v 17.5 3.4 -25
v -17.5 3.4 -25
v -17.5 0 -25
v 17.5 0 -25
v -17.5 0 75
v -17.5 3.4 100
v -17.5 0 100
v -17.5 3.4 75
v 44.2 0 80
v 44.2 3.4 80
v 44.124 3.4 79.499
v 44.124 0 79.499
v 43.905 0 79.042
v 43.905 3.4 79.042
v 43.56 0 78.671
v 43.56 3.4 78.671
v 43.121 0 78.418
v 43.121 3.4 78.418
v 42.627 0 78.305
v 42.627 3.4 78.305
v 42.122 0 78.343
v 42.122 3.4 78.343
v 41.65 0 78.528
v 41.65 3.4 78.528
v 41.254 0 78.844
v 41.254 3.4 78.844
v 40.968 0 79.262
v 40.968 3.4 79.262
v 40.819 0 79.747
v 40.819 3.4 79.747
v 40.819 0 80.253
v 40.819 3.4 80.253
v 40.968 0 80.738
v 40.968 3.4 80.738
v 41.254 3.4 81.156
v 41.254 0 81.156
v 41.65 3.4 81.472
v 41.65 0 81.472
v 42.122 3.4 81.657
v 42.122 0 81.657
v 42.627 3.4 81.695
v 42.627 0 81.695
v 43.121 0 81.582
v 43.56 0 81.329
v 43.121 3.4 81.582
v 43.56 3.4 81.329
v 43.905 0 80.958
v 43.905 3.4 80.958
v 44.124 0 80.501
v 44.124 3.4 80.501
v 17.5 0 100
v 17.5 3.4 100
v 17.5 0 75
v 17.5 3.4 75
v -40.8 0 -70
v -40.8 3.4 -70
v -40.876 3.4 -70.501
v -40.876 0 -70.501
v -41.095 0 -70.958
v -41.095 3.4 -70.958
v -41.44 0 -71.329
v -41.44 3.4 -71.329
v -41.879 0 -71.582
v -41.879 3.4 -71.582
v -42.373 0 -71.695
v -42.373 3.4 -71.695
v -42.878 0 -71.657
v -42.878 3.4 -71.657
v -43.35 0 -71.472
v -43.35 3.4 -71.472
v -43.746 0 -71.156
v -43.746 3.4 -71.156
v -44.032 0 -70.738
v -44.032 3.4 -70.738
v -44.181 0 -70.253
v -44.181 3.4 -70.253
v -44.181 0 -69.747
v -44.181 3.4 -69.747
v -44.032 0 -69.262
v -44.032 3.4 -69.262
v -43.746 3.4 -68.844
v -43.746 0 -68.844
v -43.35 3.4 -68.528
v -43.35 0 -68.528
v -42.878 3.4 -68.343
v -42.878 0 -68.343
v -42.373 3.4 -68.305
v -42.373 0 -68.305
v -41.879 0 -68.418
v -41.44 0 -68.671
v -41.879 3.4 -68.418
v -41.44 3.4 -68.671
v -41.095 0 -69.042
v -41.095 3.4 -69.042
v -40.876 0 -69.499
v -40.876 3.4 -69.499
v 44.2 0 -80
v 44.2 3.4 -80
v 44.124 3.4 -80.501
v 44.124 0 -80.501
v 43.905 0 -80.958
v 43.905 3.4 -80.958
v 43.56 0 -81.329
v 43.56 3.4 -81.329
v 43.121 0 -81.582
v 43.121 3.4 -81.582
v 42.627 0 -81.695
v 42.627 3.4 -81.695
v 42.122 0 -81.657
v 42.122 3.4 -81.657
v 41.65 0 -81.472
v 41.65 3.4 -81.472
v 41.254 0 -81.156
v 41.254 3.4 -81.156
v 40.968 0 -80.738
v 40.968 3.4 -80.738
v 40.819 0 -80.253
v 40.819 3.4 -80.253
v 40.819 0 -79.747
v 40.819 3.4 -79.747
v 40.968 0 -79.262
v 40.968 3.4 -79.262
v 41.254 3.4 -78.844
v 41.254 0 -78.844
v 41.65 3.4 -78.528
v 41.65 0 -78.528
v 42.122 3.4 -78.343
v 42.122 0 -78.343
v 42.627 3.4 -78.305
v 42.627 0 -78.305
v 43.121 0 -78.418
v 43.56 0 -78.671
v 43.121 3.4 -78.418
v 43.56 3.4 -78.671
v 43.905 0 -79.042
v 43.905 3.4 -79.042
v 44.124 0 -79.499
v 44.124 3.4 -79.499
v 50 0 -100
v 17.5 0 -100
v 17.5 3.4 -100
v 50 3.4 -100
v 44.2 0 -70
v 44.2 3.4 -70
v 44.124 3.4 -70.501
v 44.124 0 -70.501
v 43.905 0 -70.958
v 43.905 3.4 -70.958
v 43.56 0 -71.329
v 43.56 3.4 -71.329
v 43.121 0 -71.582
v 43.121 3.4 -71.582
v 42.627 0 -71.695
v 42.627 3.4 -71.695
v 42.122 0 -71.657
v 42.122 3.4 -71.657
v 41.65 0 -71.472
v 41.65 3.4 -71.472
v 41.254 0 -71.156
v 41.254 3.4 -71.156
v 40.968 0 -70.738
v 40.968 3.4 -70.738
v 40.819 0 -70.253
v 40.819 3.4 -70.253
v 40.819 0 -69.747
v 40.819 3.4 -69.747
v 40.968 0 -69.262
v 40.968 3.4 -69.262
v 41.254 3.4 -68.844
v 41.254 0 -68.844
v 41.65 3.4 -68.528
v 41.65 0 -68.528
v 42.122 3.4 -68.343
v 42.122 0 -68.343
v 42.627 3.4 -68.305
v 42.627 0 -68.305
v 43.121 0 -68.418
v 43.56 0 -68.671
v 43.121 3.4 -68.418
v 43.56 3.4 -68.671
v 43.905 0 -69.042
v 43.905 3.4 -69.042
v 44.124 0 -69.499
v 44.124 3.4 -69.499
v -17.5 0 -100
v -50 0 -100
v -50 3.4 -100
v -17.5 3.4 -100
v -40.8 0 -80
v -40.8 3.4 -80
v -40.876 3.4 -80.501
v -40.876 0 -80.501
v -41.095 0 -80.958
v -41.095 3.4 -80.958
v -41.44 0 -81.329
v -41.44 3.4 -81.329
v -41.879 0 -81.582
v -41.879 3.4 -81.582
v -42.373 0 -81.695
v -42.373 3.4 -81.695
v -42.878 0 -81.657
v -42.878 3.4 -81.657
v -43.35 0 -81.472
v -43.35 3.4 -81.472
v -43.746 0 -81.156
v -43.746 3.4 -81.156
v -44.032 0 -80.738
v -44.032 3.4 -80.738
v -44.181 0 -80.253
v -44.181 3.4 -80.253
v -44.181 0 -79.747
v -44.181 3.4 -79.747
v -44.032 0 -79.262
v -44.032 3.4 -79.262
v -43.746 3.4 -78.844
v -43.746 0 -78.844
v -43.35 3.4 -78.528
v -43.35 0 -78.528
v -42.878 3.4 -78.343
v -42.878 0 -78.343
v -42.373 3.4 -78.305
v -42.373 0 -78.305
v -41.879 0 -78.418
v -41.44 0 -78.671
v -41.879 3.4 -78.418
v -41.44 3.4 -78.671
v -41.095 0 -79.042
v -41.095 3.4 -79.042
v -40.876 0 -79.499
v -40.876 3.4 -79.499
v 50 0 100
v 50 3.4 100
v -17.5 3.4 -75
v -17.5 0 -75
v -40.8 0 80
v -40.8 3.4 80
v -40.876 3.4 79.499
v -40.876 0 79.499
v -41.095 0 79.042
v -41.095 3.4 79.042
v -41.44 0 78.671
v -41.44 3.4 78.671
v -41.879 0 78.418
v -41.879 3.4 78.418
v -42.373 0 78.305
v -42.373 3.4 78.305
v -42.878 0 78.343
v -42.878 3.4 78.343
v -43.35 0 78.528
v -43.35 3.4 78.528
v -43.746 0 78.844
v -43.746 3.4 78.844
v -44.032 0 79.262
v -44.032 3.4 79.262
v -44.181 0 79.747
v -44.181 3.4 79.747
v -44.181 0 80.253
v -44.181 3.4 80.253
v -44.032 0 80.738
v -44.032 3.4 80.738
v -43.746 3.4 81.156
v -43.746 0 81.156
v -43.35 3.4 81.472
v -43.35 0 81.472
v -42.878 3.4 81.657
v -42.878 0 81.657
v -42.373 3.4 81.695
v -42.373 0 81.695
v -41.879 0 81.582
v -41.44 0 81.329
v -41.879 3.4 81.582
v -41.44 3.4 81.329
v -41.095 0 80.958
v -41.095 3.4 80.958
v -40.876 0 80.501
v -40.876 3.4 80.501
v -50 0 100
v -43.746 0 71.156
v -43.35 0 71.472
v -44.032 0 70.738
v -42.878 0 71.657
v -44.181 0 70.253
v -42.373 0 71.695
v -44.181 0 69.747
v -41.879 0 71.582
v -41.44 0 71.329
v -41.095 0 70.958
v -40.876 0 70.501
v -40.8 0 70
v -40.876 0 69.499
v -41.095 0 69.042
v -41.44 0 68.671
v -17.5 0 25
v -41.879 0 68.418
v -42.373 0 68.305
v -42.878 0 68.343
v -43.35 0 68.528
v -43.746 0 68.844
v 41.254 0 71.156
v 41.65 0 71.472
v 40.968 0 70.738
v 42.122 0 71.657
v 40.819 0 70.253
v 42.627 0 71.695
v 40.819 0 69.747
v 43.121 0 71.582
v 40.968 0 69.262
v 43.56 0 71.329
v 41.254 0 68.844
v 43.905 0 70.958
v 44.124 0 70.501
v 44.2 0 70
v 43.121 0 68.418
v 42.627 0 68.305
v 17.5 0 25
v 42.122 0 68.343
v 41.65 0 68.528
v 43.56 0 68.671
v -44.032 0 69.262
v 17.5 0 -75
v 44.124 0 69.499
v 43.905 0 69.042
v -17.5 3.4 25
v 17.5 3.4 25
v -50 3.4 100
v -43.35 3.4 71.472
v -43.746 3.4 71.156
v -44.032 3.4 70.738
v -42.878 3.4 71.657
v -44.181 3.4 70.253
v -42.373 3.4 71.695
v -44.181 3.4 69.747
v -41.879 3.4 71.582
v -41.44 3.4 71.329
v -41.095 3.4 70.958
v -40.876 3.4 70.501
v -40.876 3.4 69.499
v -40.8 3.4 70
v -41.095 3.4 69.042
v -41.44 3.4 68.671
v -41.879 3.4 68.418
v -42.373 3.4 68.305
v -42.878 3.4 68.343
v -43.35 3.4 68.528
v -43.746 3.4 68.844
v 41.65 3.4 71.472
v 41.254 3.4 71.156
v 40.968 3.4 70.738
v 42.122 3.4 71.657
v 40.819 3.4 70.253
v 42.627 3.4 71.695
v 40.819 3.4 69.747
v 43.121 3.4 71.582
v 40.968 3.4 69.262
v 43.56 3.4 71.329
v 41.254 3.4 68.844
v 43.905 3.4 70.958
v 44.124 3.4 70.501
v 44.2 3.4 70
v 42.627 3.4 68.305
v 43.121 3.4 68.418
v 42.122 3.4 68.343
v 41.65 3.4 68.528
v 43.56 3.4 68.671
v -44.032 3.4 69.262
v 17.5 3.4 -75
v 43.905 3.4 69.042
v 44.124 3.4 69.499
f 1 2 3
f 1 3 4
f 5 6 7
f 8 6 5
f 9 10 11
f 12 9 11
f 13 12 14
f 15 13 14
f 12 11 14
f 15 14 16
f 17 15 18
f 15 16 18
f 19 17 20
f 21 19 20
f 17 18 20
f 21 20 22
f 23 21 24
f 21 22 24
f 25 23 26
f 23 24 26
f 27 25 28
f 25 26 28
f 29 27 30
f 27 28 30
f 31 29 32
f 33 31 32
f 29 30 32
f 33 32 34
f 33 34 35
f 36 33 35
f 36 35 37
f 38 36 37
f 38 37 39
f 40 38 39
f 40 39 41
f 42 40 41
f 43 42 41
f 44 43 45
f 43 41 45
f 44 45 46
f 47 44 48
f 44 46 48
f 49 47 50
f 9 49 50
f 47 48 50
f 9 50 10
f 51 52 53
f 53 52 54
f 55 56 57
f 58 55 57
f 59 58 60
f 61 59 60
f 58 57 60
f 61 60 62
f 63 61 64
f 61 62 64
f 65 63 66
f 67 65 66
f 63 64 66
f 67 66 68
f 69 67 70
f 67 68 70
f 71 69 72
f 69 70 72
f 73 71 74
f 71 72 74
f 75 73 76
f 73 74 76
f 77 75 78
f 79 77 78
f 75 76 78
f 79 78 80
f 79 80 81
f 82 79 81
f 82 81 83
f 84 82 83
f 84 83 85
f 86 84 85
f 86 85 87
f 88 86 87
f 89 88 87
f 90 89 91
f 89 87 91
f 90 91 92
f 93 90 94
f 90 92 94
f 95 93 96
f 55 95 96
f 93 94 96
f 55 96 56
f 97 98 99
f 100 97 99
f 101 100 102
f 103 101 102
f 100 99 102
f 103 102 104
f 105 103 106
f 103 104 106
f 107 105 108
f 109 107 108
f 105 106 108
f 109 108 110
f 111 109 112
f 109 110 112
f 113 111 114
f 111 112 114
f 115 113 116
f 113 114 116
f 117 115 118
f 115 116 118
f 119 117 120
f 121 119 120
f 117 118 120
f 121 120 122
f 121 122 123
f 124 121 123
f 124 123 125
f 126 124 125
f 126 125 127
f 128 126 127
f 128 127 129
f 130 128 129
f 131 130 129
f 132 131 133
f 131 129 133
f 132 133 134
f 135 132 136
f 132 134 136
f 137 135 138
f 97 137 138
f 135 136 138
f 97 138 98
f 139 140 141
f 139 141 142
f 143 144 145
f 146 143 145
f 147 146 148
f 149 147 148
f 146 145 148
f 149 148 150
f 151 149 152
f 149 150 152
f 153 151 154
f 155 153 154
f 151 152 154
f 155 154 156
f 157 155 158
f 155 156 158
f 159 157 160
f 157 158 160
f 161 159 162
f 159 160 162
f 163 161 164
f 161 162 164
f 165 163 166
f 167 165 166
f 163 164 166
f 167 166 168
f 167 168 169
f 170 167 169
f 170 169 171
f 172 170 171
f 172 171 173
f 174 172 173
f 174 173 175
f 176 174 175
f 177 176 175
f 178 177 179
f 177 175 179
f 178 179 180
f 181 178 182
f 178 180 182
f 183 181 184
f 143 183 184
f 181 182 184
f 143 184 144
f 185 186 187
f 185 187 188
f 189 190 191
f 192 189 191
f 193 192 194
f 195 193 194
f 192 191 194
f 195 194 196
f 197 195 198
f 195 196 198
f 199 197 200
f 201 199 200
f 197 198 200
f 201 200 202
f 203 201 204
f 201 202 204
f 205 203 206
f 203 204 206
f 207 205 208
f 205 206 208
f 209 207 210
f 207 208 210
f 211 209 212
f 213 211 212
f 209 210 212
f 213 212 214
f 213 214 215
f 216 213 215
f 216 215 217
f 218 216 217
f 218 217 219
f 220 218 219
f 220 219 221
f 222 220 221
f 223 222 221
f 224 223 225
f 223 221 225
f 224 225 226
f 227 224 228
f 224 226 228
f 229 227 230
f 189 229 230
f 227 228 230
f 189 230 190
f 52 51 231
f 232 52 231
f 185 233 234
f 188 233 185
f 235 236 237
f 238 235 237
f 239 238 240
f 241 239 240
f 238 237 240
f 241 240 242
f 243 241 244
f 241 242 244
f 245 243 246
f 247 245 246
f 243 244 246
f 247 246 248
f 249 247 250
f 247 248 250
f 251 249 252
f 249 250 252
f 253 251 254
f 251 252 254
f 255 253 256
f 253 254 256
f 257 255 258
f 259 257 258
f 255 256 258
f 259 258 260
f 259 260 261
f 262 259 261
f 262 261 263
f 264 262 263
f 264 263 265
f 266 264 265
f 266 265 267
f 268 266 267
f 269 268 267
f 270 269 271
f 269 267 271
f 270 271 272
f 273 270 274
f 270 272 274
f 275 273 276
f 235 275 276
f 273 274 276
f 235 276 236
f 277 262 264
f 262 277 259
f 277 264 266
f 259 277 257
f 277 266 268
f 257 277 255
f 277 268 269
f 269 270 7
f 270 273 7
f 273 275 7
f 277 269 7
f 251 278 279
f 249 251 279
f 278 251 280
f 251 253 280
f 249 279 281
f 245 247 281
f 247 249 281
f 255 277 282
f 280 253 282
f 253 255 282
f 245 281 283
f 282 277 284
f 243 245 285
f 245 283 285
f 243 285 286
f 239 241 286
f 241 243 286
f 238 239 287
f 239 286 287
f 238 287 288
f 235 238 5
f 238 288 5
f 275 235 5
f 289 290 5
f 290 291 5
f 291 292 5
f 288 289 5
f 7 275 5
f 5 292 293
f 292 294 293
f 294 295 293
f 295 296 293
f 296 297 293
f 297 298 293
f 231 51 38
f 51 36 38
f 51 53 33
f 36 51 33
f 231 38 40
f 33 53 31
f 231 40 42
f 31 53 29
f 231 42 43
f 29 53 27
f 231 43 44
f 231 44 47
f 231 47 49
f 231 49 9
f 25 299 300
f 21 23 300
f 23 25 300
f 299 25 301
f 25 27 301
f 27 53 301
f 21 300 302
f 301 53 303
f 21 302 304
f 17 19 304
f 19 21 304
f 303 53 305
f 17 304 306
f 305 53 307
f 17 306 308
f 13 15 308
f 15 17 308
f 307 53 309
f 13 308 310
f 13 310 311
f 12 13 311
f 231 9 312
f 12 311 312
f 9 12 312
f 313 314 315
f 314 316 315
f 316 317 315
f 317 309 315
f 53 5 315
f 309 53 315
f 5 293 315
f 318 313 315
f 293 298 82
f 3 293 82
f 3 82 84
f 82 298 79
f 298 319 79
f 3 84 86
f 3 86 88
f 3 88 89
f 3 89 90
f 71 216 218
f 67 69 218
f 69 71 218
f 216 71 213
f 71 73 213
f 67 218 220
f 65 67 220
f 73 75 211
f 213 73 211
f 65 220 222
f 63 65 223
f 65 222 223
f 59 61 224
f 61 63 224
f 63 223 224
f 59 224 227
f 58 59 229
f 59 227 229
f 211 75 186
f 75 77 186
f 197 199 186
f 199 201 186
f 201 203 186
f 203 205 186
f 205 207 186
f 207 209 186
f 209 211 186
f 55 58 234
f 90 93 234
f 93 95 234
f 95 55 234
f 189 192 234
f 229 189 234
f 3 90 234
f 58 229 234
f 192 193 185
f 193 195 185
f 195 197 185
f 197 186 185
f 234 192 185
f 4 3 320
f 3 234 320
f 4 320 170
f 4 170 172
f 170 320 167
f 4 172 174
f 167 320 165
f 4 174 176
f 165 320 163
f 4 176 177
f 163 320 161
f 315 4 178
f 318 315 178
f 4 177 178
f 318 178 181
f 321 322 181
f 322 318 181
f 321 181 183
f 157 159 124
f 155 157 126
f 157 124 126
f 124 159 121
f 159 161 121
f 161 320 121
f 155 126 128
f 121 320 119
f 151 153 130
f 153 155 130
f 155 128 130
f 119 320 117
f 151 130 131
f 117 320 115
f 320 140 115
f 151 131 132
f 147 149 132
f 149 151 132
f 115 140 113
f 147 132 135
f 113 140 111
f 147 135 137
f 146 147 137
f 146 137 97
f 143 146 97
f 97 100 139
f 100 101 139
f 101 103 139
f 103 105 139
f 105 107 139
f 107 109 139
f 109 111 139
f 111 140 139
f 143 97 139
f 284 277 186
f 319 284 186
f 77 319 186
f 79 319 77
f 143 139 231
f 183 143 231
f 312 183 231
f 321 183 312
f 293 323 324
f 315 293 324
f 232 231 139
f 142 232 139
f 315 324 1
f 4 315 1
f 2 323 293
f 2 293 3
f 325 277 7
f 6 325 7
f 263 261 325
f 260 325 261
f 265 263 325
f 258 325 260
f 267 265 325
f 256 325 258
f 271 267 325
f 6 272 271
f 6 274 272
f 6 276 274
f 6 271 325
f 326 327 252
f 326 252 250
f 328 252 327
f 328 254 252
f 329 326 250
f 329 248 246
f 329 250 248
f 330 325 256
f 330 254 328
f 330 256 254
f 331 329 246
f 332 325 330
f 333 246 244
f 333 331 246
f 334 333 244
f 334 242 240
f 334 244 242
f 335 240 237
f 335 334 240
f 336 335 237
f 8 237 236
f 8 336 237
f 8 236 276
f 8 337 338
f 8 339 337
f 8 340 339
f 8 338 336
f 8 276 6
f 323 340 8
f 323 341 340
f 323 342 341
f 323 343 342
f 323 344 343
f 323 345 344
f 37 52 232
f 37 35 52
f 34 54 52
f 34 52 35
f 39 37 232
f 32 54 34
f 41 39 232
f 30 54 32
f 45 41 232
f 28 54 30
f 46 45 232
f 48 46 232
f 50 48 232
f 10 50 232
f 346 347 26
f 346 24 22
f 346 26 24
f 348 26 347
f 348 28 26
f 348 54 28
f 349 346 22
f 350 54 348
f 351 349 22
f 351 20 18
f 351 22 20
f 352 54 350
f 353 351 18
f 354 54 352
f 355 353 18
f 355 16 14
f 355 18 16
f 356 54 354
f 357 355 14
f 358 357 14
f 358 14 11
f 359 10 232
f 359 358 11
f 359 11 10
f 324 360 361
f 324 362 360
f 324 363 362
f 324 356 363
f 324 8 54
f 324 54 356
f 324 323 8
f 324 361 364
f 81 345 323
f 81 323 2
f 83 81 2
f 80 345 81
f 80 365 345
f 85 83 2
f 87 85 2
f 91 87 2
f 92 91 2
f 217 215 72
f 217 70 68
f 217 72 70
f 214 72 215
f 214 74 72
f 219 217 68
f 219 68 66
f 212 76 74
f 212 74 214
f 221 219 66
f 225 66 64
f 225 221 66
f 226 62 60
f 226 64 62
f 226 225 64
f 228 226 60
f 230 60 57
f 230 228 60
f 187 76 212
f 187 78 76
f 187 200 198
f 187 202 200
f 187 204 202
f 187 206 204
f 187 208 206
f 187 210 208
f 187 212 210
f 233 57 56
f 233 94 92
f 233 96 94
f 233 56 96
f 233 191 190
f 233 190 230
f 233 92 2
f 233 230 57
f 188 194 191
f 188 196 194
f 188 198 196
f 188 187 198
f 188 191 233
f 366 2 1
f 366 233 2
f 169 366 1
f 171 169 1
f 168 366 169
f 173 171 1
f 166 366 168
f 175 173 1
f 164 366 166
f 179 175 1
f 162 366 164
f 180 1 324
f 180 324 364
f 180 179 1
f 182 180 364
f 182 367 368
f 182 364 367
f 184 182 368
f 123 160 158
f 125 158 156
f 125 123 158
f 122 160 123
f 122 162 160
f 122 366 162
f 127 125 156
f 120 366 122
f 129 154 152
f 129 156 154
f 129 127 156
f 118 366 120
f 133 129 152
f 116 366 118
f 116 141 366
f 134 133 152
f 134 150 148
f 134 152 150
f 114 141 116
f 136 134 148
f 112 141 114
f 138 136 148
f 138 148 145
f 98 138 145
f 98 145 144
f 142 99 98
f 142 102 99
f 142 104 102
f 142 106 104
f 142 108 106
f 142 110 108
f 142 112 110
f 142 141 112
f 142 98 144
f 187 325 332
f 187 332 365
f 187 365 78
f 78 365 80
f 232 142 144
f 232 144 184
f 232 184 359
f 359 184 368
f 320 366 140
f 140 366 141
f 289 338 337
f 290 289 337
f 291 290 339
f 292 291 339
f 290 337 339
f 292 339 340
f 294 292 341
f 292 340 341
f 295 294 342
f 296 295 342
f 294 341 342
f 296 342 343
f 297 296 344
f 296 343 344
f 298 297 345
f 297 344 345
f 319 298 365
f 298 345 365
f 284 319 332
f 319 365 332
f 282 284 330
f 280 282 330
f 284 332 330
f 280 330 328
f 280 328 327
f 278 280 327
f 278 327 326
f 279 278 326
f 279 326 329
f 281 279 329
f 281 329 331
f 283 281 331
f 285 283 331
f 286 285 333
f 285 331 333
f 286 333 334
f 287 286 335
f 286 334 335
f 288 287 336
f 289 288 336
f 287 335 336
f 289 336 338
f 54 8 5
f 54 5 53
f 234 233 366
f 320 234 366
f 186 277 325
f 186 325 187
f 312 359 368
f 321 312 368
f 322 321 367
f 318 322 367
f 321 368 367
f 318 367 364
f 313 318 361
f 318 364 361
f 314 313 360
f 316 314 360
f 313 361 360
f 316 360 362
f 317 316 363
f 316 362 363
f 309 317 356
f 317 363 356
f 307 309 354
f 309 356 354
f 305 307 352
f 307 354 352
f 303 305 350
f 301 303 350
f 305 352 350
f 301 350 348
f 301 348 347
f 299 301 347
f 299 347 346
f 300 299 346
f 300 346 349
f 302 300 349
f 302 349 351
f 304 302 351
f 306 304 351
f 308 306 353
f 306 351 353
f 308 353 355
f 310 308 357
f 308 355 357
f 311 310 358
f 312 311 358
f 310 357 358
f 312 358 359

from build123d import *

# Parameters (mm, degrees)
CROQUIS1_W              = 100
CROQUIS1_H              = 200
SALIENTE_EXTRUIR1_DEPTH = 3.4
CROQUIS2_R              = 1.7
CROQUIS2_W              = 35
CROQUIS2_H              = 25
CROQUIS2_H_2            = 50
CORTAR_EXTRUIR1_DEPTH   = 3.4


with BuildPart() as part:
    # Croquis1 → Saliente-Extruir1 (new body)
    with BuildSketch(Plane(origin=(0, 0, 0), x_dir=(1, 0, 0), z_dir=(0, 1, 0))):
        Rectangle(CROQUIS1_W, CROQUIS1_H)
    extrude(amount=SALIENTE_EXTRUIR1_DEPTH)

    # Croquis2 → Cortar-Extruir1 (cut)
    with BuildSketch(Plane(origin=(0, 3.4, 0), x_dir=(1, 0, 0), z_dir=(0, 1, 0))):
        with Locations((42.5, -80)):
            Circle(CROQUIS2_R)
        with Locations((42.5, -70)):
            Circle(CROQUIS2_R)
        with Locations((-42.5, -80)):
            Circle(CROQUIS2_R)
        with Locations((-42.5, -70)):
            Circle(CROQUIS2_R)
        with Locations((42.5, 70)):
            Circle(CROQUIS2_R)
        with Locations((42.5, 80)):
            Circle(CROQUIS2_R)
        with Locations((-42.5, 70)):
            Circle(CROQUIS2_R)
        with Locations((-42.5, 80)):
            Circle(CROQUIS2_R)
        with Locations((0, 87.5)):
            Rectangle(CROQUIS2_W, CROQUIS2_H)
        Rectangle(CROQUIS2_W, CROQUIS2_H_2)
        with Locations((0, -87.5)):
            Rectangle(CROQUIS2_W, CROQUIS2_H)
    extrude(amount=-CORTAR_EXTRUIR1_DEPTH, mode=Mode.SUBTRACT)


solid = part.part
